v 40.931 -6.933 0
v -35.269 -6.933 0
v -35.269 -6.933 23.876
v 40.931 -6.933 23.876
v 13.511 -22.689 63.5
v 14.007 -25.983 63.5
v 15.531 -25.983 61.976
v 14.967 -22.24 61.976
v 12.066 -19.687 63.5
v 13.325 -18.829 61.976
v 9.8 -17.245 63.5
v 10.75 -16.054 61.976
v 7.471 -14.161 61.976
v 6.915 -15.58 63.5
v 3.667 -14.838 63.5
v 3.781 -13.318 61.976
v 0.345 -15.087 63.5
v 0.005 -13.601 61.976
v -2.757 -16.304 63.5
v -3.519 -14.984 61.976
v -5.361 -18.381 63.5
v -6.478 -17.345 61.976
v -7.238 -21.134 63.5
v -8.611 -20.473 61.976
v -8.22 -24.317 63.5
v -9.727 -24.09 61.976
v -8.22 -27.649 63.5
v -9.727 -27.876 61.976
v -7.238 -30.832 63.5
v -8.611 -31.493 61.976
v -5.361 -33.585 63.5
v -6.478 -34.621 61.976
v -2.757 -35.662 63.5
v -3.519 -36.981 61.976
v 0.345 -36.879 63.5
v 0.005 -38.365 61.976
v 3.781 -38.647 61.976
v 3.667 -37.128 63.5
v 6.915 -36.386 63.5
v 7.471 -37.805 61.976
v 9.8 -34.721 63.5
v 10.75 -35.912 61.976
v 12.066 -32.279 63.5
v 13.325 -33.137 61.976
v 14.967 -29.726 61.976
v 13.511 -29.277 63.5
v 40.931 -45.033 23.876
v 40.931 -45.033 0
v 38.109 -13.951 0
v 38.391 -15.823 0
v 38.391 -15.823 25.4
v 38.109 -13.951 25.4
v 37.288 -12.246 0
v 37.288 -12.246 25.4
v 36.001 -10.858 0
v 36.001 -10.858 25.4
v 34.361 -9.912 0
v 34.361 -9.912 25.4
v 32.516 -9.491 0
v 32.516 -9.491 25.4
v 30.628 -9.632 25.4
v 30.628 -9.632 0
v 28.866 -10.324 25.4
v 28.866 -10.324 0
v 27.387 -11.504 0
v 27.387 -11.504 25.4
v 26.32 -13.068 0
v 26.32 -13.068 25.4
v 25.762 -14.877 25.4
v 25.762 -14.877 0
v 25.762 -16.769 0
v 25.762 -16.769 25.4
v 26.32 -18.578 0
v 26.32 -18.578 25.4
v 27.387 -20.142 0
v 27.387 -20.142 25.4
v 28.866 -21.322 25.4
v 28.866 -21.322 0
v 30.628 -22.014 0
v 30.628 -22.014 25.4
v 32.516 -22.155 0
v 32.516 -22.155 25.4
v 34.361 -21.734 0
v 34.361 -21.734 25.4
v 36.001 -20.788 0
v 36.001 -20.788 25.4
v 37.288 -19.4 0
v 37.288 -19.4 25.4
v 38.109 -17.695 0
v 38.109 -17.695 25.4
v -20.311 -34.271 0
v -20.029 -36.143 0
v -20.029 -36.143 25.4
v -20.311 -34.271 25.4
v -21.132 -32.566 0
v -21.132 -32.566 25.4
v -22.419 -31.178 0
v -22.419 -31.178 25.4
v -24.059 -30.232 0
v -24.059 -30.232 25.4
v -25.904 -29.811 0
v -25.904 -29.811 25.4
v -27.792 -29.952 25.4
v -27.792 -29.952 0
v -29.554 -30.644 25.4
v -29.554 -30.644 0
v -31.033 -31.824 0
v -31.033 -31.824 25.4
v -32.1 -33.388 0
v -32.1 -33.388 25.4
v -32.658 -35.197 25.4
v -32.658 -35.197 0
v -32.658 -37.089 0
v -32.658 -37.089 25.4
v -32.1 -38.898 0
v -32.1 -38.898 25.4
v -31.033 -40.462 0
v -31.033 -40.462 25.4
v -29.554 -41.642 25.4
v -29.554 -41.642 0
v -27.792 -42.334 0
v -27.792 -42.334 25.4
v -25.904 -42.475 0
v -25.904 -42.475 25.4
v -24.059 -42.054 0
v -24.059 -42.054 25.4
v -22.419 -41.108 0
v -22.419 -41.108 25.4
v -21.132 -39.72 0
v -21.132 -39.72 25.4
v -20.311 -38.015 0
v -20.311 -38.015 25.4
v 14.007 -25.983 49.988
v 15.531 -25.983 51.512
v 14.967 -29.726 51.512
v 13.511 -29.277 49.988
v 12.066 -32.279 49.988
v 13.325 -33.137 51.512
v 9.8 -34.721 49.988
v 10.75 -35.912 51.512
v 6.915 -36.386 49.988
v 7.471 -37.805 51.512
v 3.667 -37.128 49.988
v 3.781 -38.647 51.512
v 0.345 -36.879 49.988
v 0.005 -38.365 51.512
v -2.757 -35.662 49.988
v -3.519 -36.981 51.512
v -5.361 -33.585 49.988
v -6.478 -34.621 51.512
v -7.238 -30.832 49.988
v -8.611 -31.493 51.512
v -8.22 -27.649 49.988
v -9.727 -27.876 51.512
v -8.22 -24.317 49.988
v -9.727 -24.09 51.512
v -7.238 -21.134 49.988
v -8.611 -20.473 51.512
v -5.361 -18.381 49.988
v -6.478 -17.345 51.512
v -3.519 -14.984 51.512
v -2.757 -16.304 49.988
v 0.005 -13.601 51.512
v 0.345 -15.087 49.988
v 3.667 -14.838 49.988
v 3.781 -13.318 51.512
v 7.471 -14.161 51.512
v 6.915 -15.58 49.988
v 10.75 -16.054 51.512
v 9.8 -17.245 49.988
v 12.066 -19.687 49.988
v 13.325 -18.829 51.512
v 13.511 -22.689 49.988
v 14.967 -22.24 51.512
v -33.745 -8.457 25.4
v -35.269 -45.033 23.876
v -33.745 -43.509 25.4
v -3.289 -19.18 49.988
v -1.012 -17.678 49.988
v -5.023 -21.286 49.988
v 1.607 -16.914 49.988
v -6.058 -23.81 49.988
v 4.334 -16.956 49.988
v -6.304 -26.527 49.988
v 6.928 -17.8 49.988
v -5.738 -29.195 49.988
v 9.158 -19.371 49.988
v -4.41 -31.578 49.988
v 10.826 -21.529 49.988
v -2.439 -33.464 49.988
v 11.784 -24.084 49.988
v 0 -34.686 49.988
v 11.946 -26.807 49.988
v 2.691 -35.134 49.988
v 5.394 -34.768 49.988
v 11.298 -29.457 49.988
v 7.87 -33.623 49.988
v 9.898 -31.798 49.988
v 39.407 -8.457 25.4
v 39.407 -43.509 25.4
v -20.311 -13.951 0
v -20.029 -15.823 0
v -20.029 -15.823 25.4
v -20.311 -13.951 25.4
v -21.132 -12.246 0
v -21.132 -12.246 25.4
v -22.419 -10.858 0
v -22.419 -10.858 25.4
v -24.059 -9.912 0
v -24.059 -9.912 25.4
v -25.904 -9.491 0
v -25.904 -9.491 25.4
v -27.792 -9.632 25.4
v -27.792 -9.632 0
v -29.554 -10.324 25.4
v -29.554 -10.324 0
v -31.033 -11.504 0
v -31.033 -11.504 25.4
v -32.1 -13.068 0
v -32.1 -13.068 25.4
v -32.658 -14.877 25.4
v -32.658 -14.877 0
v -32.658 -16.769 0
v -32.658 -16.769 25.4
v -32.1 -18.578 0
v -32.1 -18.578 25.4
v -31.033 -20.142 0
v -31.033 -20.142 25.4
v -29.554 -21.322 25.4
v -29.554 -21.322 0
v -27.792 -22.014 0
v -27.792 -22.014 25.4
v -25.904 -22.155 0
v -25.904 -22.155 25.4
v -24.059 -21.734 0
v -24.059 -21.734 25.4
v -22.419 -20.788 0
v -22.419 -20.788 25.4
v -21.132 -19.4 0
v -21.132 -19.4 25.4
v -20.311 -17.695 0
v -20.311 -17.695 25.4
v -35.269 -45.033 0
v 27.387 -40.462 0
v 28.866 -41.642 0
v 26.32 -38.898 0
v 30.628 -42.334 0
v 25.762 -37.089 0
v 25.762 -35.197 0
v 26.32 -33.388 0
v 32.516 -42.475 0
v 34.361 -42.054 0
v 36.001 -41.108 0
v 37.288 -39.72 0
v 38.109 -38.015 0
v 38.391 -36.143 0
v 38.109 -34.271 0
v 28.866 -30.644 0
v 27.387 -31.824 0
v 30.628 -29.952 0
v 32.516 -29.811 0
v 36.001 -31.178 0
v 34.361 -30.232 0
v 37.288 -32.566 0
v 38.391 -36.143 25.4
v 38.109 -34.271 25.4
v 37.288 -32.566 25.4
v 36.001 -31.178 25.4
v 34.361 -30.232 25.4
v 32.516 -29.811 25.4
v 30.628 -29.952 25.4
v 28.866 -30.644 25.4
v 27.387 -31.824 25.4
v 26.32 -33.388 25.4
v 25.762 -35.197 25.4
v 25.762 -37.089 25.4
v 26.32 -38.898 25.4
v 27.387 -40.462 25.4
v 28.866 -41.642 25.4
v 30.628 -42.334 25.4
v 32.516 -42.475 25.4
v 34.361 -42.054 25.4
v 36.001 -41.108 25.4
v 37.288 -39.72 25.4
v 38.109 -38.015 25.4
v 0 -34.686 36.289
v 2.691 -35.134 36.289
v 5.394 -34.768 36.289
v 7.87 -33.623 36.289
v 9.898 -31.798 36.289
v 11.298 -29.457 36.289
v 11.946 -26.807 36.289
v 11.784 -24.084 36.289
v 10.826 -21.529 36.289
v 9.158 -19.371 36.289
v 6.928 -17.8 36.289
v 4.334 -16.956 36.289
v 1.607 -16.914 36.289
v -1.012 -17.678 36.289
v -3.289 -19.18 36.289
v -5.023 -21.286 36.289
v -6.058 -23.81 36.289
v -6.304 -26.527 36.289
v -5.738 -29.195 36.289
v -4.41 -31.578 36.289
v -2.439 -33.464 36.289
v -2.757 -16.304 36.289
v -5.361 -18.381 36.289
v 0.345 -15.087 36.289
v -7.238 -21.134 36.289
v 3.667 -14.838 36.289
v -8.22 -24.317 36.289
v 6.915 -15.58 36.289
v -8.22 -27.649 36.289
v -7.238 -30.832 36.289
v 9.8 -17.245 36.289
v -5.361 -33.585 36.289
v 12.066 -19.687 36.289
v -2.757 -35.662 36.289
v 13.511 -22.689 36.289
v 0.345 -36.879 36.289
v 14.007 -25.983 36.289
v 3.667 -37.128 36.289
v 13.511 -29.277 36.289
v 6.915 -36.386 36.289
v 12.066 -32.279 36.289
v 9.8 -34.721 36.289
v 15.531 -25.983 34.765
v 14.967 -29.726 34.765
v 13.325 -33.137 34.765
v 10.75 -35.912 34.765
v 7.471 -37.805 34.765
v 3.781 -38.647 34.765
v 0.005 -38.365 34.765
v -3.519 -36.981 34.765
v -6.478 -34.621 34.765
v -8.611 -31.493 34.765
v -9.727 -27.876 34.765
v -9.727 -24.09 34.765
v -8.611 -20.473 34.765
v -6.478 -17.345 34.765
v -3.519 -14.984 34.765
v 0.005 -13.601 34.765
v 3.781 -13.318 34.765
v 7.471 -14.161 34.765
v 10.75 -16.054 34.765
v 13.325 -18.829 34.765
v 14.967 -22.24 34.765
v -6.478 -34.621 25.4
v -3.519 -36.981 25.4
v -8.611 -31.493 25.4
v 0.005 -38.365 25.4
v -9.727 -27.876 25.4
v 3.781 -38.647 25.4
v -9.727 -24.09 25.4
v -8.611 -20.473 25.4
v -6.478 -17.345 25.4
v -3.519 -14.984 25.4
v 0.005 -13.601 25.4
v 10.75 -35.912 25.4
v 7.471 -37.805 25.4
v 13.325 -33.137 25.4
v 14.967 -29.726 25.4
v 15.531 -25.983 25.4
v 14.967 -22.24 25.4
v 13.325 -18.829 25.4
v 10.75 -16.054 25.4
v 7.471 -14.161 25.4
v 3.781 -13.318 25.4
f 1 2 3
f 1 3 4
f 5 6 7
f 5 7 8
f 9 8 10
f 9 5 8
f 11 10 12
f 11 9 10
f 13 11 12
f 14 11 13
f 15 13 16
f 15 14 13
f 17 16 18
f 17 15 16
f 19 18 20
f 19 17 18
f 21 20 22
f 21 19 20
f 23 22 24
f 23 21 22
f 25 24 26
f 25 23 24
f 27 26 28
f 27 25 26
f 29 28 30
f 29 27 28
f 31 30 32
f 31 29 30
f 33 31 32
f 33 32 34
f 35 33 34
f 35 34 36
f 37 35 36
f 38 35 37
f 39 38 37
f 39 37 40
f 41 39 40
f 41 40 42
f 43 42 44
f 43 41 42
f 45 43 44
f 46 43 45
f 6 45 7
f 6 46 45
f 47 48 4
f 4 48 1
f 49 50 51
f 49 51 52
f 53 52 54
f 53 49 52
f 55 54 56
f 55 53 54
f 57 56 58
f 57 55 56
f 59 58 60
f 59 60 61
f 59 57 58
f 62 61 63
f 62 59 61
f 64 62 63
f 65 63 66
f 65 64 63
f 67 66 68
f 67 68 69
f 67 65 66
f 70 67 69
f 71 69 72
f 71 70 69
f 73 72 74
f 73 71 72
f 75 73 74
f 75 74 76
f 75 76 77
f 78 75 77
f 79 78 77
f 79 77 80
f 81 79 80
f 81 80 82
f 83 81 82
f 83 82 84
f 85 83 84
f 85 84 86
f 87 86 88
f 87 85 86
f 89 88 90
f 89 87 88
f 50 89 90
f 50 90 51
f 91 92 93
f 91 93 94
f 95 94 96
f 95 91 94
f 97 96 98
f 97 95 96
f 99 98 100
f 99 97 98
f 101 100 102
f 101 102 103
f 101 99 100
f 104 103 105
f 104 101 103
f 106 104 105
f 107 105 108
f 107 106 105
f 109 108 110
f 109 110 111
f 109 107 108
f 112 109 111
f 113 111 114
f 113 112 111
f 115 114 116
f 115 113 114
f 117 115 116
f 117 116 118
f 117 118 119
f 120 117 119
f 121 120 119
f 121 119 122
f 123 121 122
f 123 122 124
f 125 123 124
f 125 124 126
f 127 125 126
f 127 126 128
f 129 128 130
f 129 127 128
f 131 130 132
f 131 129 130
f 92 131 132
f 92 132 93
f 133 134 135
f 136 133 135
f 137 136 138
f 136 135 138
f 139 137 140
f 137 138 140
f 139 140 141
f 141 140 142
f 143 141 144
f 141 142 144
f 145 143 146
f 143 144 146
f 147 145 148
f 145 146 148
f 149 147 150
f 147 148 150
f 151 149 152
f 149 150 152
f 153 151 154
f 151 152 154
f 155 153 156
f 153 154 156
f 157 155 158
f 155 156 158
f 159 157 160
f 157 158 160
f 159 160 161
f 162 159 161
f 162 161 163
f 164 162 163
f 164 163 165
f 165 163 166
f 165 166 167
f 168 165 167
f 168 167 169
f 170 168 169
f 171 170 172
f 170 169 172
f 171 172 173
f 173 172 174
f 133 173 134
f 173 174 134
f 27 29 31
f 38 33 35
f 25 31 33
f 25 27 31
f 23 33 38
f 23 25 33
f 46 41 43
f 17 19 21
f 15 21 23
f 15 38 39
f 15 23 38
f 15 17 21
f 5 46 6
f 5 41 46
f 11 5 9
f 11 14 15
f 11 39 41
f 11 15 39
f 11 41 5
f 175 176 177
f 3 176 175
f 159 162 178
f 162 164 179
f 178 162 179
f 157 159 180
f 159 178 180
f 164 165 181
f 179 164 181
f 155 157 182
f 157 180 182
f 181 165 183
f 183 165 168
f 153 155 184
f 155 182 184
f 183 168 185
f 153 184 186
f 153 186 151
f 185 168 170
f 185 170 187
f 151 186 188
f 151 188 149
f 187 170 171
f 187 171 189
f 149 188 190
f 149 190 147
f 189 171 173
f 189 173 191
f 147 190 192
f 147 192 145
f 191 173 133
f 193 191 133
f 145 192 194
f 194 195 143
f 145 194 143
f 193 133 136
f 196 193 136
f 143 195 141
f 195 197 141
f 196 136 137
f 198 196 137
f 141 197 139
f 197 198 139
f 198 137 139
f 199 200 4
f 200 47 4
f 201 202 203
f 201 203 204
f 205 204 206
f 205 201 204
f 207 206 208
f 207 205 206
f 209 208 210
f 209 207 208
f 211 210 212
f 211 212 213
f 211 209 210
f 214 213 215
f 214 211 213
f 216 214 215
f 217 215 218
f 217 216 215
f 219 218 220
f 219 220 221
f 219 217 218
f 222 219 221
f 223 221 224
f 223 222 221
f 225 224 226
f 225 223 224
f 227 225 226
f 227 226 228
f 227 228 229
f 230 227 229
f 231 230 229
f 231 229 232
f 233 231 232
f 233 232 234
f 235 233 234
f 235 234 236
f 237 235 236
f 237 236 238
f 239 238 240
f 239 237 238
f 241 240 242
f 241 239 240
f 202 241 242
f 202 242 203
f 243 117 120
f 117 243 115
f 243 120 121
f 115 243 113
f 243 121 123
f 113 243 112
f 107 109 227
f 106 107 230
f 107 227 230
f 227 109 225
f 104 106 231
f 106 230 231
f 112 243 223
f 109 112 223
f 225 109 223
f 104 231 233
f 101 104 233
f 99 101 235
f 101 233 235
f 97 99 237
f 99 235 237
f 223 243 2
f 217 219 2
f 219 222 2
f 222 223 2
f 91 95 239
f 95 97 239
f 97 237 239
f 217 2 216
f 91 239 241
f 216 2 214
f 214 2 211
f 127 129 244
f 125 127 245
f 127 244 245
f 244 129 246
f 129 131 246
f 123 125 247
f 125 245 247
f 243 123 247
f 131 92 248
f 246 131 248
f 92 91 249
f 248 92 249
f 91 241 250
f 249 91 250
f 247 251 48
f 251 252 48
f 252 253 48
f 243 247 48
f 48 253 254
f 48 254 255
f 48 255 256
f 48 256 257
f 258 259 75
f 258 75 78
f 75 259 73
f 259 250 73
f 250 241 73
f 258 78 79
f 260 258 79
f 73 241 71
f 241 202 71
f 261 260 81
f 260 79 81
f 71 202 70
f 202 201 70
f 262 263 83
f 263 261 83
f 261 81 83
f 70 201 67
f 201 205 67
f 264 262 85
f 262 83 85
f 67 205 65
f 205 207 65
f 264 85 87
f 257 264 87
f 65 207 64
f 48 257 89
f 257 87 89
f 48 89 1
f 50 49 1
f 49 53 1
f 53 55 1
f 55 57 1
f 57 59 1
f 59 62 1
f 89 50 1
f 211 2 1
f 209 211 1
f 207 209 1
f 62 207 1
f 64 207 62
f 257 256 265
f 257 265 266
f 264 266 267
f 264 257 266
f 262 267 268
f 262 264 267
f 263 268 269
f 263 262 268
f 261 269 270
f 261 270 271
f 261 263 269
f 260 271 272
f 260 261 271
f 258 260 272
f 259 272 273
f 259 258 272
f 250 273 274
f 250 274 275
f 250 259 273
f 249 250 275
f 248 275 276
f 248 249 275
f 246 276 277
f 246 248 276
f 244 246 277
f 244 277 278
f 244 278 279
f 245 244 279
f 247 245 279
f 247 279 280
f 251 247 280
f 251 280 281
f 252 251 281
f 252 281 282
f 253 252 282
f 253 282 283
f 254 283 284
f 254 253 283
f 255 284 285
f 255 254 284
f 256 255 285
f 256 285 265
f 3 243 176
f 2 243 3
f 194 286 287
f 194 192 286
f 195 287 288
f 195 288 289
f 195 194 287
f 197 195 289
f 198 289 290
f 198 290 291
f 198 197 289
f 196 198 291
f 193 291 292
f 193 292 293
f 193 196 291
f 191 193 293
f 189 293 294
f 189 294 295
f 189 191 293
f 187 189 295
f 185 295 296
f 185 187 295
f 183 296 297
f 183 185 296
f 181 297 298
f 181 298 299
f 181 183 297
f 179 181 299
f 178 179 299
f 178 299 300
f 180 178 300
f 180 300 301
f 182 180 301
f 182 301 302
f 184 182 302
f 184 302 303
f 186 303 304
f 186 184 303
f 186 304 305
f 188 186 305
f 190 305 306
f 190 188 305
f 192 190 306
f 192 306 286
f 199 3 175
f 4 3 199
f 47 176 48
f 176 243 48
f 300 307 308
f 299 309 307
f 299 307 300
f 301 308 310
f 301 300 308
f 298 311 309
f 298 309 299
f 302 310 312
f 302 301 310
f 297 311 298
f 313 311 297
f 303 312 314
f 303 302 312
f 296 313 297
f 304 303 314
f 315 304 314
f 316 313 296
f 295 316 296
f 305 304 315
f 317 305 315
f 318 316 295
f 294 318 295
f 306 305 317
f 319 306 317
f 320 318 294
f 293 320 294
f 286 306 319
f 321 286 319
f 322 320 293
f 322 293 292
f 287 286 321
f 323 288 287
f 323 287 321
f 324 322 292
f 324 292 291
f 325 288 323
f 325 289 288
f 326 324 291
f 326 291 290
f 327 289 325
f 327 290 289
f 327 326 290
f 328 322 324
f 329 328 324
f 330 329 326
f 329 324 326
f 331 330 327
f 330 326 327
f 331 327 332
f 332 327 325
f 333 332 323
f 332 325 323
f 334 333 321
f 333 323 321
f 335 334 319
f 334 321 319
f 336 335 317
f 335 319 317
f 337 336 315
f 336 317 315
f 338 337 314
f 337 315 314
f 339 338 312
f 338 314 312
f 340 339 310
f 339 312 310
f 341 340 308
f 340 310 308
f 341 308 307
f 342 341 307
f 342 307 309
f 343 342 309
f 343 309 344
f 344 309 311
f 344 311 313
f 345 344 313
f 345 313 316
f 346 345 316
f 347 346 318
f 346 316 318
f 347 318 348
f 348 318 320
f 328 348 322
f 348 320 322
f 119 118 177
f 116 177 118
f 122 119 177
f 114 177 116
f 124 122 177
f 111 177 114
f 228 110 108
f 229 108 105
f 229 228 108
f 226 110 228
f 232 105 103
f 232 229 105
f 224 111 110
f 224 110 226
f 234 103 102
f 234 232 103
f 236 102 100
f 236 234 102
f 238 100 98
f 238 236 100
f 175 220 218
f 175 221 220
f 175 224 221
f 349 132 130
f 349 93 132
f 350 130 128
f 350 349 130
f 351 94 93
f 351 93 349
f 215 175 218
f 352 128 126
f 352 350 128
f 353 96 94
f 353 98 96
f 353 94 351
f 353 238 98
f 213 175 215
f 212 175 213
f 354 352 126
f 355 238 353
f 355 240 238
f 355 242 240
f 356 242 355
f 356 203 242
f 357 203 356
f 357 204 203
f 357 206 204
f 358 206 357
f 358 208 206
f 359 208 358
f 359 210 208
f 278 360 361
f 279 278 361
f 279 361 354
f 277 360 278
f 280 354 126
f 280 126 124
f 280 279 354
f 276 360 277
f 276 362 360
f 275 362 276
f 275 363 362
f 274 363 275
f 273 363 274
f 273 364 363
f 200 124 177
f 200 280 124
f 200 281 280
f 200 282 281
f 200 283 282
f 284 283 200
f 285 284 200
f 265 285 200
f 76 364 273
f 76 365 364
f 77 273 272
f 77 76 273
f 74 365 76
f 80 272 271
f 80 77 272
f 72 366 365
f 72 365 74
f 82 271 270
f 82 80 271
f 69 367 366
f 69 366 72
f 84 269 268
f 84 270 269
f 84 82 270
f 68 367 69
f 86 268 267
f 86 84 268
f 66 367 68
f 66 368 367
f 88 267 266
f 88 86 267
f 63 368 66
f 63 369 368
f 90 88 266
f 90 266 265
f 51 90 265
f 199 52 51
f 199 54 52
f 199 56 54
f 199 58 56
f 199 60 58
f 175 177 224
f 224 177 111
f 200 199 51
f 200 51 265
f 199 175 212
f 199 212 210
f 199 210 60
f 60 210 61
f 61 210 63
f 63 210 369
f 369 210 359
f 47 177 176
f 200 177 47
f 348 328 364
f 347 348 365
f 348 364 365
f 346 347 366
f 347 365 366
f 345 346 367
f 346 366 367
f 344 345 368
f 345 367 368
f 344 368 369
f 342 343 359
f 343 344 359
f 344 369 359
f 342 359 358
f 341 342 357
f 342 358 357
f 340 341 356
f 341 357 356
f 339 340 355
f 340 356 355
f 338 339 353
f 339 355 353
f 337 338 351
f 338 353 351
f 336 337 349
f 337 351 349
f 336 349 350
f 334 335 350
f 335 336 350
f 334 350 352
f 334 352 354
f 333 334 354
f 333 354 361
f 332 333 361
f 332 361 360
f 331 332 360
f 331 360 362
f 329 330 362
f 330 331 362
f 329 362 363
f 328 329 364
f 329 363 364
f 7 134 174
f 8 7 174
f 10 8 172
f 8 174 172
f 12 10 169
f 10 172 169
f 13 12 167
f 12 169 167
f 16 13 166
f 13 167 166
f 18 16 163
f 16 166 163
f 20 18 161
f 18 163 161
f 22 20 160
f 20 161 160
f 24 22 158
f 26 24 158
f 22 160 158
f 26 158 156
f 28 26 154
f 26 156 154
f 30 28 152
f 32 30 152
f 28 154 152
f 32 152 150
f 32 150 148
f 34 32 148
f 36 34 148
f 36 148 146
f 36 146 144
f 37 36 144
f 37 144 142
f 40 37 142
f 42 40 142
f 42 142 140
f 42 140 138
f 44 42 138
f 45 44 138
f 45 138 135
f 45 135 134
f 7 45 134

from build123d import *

# Parameters (mm, degrees)
F0_W     = 76.2
F0_H     = 38.1
F1_DEPTH = 25.4
F2_R     = 6.35
F3_DEPTH = 25.4
F4_DEPTH = 25.4
F5_R     = 12.7
F6_DEPTH = 38.1
F7_W     = 16.6140981019
F7_H     = 13.6993415654
F9_SIZE  = 1.524
F10_SIZE = 1.524
F11_SIZE = 1.524


with BuildPart() as f1:
    # F0 (on Top) → F1 (new body)
    with BuildSketch(Plane.XY):
        with Locations((2.8314734757, -25.9829519808)):
            Rectangle(F0_W, F0_H)
    extrude(amount=F1_DEPTH)

    # F2 (on Top) → F3 (cut)
    with BuildSketch(Plane.XY):
        with Locations((-26.3785265243, -15.8229519808)):
            Circle(F2_R)
    extrude(amount=F3_DEPTH, mode=Mode.SUBTRACT)

    # F2 (on Top) → F4 (cut)
    with BuildSketch(Plane.XY):
        with Locations((-26.3785265243, -15.8229519808)):
            Circle(F2_R)
        with Locations((-26.3785265243, -36.1429519808)):
            Circle(F2_R)
        with Locations((32.0414734757, -15.8229519808)):
            Circle(F2_R)
        with Locations((32.0414734757, -36.1429519808)):
            Circle(F2_R)
    extrude(amount=F4_DEPTH, mode=Mode.SUBTRACT)

    # F5 (on face) → F6 (join)
    with BuildSketch(Plane.XY.offset(25.4)):
        with Locations((2.8314734757, -25.9829519808)):
            Circle(F5_R)
    extrude(amount=F6_DEPTH)

    # F7 (on Right) → F8 (revolve, cut)
    with BuildSketch(Plane.YZ):
        with Locations((-42.9926235229, 43.1383606046)):
            Rectangle(F7_W, F7_H)
    revolve(axis=Axis((2.8314734757, -25.9829519808, 63.5), (0, 0, 1)), mode=Mode.SUBTRACT)

    # F9
    f9_edges = [f1.edges().sort_by_distance(p)[0] for p in [
        (40.931473, -25.982952, 25.4),
    ]]
    chamfer(f9_edges, length=F9_SIZE)

    # F10
    f10_edges = [f1.edges().sort_by_distance(p)[0] for p in [
        (2.069473, -6.932952, 25.4),
        (-35.268527, -25.982952, 25.4),
    ]]
    chamfer(f10_edges, length=F10_SIZE)

    # F11
    f11_edges = [f1.edges().sort_by_distance(p)[0] for p in [
        (2.831473, -45.032952, 25.4),
        (-9.868527, -25.982952, 36.28869),
        (-9.868527, -25.982952, 49.988031),
        (-9.868527, -25.982952, 63.5),
    ]]
    chamfer(f11_edges, length=F11_SIZE)


solid = f1.part
